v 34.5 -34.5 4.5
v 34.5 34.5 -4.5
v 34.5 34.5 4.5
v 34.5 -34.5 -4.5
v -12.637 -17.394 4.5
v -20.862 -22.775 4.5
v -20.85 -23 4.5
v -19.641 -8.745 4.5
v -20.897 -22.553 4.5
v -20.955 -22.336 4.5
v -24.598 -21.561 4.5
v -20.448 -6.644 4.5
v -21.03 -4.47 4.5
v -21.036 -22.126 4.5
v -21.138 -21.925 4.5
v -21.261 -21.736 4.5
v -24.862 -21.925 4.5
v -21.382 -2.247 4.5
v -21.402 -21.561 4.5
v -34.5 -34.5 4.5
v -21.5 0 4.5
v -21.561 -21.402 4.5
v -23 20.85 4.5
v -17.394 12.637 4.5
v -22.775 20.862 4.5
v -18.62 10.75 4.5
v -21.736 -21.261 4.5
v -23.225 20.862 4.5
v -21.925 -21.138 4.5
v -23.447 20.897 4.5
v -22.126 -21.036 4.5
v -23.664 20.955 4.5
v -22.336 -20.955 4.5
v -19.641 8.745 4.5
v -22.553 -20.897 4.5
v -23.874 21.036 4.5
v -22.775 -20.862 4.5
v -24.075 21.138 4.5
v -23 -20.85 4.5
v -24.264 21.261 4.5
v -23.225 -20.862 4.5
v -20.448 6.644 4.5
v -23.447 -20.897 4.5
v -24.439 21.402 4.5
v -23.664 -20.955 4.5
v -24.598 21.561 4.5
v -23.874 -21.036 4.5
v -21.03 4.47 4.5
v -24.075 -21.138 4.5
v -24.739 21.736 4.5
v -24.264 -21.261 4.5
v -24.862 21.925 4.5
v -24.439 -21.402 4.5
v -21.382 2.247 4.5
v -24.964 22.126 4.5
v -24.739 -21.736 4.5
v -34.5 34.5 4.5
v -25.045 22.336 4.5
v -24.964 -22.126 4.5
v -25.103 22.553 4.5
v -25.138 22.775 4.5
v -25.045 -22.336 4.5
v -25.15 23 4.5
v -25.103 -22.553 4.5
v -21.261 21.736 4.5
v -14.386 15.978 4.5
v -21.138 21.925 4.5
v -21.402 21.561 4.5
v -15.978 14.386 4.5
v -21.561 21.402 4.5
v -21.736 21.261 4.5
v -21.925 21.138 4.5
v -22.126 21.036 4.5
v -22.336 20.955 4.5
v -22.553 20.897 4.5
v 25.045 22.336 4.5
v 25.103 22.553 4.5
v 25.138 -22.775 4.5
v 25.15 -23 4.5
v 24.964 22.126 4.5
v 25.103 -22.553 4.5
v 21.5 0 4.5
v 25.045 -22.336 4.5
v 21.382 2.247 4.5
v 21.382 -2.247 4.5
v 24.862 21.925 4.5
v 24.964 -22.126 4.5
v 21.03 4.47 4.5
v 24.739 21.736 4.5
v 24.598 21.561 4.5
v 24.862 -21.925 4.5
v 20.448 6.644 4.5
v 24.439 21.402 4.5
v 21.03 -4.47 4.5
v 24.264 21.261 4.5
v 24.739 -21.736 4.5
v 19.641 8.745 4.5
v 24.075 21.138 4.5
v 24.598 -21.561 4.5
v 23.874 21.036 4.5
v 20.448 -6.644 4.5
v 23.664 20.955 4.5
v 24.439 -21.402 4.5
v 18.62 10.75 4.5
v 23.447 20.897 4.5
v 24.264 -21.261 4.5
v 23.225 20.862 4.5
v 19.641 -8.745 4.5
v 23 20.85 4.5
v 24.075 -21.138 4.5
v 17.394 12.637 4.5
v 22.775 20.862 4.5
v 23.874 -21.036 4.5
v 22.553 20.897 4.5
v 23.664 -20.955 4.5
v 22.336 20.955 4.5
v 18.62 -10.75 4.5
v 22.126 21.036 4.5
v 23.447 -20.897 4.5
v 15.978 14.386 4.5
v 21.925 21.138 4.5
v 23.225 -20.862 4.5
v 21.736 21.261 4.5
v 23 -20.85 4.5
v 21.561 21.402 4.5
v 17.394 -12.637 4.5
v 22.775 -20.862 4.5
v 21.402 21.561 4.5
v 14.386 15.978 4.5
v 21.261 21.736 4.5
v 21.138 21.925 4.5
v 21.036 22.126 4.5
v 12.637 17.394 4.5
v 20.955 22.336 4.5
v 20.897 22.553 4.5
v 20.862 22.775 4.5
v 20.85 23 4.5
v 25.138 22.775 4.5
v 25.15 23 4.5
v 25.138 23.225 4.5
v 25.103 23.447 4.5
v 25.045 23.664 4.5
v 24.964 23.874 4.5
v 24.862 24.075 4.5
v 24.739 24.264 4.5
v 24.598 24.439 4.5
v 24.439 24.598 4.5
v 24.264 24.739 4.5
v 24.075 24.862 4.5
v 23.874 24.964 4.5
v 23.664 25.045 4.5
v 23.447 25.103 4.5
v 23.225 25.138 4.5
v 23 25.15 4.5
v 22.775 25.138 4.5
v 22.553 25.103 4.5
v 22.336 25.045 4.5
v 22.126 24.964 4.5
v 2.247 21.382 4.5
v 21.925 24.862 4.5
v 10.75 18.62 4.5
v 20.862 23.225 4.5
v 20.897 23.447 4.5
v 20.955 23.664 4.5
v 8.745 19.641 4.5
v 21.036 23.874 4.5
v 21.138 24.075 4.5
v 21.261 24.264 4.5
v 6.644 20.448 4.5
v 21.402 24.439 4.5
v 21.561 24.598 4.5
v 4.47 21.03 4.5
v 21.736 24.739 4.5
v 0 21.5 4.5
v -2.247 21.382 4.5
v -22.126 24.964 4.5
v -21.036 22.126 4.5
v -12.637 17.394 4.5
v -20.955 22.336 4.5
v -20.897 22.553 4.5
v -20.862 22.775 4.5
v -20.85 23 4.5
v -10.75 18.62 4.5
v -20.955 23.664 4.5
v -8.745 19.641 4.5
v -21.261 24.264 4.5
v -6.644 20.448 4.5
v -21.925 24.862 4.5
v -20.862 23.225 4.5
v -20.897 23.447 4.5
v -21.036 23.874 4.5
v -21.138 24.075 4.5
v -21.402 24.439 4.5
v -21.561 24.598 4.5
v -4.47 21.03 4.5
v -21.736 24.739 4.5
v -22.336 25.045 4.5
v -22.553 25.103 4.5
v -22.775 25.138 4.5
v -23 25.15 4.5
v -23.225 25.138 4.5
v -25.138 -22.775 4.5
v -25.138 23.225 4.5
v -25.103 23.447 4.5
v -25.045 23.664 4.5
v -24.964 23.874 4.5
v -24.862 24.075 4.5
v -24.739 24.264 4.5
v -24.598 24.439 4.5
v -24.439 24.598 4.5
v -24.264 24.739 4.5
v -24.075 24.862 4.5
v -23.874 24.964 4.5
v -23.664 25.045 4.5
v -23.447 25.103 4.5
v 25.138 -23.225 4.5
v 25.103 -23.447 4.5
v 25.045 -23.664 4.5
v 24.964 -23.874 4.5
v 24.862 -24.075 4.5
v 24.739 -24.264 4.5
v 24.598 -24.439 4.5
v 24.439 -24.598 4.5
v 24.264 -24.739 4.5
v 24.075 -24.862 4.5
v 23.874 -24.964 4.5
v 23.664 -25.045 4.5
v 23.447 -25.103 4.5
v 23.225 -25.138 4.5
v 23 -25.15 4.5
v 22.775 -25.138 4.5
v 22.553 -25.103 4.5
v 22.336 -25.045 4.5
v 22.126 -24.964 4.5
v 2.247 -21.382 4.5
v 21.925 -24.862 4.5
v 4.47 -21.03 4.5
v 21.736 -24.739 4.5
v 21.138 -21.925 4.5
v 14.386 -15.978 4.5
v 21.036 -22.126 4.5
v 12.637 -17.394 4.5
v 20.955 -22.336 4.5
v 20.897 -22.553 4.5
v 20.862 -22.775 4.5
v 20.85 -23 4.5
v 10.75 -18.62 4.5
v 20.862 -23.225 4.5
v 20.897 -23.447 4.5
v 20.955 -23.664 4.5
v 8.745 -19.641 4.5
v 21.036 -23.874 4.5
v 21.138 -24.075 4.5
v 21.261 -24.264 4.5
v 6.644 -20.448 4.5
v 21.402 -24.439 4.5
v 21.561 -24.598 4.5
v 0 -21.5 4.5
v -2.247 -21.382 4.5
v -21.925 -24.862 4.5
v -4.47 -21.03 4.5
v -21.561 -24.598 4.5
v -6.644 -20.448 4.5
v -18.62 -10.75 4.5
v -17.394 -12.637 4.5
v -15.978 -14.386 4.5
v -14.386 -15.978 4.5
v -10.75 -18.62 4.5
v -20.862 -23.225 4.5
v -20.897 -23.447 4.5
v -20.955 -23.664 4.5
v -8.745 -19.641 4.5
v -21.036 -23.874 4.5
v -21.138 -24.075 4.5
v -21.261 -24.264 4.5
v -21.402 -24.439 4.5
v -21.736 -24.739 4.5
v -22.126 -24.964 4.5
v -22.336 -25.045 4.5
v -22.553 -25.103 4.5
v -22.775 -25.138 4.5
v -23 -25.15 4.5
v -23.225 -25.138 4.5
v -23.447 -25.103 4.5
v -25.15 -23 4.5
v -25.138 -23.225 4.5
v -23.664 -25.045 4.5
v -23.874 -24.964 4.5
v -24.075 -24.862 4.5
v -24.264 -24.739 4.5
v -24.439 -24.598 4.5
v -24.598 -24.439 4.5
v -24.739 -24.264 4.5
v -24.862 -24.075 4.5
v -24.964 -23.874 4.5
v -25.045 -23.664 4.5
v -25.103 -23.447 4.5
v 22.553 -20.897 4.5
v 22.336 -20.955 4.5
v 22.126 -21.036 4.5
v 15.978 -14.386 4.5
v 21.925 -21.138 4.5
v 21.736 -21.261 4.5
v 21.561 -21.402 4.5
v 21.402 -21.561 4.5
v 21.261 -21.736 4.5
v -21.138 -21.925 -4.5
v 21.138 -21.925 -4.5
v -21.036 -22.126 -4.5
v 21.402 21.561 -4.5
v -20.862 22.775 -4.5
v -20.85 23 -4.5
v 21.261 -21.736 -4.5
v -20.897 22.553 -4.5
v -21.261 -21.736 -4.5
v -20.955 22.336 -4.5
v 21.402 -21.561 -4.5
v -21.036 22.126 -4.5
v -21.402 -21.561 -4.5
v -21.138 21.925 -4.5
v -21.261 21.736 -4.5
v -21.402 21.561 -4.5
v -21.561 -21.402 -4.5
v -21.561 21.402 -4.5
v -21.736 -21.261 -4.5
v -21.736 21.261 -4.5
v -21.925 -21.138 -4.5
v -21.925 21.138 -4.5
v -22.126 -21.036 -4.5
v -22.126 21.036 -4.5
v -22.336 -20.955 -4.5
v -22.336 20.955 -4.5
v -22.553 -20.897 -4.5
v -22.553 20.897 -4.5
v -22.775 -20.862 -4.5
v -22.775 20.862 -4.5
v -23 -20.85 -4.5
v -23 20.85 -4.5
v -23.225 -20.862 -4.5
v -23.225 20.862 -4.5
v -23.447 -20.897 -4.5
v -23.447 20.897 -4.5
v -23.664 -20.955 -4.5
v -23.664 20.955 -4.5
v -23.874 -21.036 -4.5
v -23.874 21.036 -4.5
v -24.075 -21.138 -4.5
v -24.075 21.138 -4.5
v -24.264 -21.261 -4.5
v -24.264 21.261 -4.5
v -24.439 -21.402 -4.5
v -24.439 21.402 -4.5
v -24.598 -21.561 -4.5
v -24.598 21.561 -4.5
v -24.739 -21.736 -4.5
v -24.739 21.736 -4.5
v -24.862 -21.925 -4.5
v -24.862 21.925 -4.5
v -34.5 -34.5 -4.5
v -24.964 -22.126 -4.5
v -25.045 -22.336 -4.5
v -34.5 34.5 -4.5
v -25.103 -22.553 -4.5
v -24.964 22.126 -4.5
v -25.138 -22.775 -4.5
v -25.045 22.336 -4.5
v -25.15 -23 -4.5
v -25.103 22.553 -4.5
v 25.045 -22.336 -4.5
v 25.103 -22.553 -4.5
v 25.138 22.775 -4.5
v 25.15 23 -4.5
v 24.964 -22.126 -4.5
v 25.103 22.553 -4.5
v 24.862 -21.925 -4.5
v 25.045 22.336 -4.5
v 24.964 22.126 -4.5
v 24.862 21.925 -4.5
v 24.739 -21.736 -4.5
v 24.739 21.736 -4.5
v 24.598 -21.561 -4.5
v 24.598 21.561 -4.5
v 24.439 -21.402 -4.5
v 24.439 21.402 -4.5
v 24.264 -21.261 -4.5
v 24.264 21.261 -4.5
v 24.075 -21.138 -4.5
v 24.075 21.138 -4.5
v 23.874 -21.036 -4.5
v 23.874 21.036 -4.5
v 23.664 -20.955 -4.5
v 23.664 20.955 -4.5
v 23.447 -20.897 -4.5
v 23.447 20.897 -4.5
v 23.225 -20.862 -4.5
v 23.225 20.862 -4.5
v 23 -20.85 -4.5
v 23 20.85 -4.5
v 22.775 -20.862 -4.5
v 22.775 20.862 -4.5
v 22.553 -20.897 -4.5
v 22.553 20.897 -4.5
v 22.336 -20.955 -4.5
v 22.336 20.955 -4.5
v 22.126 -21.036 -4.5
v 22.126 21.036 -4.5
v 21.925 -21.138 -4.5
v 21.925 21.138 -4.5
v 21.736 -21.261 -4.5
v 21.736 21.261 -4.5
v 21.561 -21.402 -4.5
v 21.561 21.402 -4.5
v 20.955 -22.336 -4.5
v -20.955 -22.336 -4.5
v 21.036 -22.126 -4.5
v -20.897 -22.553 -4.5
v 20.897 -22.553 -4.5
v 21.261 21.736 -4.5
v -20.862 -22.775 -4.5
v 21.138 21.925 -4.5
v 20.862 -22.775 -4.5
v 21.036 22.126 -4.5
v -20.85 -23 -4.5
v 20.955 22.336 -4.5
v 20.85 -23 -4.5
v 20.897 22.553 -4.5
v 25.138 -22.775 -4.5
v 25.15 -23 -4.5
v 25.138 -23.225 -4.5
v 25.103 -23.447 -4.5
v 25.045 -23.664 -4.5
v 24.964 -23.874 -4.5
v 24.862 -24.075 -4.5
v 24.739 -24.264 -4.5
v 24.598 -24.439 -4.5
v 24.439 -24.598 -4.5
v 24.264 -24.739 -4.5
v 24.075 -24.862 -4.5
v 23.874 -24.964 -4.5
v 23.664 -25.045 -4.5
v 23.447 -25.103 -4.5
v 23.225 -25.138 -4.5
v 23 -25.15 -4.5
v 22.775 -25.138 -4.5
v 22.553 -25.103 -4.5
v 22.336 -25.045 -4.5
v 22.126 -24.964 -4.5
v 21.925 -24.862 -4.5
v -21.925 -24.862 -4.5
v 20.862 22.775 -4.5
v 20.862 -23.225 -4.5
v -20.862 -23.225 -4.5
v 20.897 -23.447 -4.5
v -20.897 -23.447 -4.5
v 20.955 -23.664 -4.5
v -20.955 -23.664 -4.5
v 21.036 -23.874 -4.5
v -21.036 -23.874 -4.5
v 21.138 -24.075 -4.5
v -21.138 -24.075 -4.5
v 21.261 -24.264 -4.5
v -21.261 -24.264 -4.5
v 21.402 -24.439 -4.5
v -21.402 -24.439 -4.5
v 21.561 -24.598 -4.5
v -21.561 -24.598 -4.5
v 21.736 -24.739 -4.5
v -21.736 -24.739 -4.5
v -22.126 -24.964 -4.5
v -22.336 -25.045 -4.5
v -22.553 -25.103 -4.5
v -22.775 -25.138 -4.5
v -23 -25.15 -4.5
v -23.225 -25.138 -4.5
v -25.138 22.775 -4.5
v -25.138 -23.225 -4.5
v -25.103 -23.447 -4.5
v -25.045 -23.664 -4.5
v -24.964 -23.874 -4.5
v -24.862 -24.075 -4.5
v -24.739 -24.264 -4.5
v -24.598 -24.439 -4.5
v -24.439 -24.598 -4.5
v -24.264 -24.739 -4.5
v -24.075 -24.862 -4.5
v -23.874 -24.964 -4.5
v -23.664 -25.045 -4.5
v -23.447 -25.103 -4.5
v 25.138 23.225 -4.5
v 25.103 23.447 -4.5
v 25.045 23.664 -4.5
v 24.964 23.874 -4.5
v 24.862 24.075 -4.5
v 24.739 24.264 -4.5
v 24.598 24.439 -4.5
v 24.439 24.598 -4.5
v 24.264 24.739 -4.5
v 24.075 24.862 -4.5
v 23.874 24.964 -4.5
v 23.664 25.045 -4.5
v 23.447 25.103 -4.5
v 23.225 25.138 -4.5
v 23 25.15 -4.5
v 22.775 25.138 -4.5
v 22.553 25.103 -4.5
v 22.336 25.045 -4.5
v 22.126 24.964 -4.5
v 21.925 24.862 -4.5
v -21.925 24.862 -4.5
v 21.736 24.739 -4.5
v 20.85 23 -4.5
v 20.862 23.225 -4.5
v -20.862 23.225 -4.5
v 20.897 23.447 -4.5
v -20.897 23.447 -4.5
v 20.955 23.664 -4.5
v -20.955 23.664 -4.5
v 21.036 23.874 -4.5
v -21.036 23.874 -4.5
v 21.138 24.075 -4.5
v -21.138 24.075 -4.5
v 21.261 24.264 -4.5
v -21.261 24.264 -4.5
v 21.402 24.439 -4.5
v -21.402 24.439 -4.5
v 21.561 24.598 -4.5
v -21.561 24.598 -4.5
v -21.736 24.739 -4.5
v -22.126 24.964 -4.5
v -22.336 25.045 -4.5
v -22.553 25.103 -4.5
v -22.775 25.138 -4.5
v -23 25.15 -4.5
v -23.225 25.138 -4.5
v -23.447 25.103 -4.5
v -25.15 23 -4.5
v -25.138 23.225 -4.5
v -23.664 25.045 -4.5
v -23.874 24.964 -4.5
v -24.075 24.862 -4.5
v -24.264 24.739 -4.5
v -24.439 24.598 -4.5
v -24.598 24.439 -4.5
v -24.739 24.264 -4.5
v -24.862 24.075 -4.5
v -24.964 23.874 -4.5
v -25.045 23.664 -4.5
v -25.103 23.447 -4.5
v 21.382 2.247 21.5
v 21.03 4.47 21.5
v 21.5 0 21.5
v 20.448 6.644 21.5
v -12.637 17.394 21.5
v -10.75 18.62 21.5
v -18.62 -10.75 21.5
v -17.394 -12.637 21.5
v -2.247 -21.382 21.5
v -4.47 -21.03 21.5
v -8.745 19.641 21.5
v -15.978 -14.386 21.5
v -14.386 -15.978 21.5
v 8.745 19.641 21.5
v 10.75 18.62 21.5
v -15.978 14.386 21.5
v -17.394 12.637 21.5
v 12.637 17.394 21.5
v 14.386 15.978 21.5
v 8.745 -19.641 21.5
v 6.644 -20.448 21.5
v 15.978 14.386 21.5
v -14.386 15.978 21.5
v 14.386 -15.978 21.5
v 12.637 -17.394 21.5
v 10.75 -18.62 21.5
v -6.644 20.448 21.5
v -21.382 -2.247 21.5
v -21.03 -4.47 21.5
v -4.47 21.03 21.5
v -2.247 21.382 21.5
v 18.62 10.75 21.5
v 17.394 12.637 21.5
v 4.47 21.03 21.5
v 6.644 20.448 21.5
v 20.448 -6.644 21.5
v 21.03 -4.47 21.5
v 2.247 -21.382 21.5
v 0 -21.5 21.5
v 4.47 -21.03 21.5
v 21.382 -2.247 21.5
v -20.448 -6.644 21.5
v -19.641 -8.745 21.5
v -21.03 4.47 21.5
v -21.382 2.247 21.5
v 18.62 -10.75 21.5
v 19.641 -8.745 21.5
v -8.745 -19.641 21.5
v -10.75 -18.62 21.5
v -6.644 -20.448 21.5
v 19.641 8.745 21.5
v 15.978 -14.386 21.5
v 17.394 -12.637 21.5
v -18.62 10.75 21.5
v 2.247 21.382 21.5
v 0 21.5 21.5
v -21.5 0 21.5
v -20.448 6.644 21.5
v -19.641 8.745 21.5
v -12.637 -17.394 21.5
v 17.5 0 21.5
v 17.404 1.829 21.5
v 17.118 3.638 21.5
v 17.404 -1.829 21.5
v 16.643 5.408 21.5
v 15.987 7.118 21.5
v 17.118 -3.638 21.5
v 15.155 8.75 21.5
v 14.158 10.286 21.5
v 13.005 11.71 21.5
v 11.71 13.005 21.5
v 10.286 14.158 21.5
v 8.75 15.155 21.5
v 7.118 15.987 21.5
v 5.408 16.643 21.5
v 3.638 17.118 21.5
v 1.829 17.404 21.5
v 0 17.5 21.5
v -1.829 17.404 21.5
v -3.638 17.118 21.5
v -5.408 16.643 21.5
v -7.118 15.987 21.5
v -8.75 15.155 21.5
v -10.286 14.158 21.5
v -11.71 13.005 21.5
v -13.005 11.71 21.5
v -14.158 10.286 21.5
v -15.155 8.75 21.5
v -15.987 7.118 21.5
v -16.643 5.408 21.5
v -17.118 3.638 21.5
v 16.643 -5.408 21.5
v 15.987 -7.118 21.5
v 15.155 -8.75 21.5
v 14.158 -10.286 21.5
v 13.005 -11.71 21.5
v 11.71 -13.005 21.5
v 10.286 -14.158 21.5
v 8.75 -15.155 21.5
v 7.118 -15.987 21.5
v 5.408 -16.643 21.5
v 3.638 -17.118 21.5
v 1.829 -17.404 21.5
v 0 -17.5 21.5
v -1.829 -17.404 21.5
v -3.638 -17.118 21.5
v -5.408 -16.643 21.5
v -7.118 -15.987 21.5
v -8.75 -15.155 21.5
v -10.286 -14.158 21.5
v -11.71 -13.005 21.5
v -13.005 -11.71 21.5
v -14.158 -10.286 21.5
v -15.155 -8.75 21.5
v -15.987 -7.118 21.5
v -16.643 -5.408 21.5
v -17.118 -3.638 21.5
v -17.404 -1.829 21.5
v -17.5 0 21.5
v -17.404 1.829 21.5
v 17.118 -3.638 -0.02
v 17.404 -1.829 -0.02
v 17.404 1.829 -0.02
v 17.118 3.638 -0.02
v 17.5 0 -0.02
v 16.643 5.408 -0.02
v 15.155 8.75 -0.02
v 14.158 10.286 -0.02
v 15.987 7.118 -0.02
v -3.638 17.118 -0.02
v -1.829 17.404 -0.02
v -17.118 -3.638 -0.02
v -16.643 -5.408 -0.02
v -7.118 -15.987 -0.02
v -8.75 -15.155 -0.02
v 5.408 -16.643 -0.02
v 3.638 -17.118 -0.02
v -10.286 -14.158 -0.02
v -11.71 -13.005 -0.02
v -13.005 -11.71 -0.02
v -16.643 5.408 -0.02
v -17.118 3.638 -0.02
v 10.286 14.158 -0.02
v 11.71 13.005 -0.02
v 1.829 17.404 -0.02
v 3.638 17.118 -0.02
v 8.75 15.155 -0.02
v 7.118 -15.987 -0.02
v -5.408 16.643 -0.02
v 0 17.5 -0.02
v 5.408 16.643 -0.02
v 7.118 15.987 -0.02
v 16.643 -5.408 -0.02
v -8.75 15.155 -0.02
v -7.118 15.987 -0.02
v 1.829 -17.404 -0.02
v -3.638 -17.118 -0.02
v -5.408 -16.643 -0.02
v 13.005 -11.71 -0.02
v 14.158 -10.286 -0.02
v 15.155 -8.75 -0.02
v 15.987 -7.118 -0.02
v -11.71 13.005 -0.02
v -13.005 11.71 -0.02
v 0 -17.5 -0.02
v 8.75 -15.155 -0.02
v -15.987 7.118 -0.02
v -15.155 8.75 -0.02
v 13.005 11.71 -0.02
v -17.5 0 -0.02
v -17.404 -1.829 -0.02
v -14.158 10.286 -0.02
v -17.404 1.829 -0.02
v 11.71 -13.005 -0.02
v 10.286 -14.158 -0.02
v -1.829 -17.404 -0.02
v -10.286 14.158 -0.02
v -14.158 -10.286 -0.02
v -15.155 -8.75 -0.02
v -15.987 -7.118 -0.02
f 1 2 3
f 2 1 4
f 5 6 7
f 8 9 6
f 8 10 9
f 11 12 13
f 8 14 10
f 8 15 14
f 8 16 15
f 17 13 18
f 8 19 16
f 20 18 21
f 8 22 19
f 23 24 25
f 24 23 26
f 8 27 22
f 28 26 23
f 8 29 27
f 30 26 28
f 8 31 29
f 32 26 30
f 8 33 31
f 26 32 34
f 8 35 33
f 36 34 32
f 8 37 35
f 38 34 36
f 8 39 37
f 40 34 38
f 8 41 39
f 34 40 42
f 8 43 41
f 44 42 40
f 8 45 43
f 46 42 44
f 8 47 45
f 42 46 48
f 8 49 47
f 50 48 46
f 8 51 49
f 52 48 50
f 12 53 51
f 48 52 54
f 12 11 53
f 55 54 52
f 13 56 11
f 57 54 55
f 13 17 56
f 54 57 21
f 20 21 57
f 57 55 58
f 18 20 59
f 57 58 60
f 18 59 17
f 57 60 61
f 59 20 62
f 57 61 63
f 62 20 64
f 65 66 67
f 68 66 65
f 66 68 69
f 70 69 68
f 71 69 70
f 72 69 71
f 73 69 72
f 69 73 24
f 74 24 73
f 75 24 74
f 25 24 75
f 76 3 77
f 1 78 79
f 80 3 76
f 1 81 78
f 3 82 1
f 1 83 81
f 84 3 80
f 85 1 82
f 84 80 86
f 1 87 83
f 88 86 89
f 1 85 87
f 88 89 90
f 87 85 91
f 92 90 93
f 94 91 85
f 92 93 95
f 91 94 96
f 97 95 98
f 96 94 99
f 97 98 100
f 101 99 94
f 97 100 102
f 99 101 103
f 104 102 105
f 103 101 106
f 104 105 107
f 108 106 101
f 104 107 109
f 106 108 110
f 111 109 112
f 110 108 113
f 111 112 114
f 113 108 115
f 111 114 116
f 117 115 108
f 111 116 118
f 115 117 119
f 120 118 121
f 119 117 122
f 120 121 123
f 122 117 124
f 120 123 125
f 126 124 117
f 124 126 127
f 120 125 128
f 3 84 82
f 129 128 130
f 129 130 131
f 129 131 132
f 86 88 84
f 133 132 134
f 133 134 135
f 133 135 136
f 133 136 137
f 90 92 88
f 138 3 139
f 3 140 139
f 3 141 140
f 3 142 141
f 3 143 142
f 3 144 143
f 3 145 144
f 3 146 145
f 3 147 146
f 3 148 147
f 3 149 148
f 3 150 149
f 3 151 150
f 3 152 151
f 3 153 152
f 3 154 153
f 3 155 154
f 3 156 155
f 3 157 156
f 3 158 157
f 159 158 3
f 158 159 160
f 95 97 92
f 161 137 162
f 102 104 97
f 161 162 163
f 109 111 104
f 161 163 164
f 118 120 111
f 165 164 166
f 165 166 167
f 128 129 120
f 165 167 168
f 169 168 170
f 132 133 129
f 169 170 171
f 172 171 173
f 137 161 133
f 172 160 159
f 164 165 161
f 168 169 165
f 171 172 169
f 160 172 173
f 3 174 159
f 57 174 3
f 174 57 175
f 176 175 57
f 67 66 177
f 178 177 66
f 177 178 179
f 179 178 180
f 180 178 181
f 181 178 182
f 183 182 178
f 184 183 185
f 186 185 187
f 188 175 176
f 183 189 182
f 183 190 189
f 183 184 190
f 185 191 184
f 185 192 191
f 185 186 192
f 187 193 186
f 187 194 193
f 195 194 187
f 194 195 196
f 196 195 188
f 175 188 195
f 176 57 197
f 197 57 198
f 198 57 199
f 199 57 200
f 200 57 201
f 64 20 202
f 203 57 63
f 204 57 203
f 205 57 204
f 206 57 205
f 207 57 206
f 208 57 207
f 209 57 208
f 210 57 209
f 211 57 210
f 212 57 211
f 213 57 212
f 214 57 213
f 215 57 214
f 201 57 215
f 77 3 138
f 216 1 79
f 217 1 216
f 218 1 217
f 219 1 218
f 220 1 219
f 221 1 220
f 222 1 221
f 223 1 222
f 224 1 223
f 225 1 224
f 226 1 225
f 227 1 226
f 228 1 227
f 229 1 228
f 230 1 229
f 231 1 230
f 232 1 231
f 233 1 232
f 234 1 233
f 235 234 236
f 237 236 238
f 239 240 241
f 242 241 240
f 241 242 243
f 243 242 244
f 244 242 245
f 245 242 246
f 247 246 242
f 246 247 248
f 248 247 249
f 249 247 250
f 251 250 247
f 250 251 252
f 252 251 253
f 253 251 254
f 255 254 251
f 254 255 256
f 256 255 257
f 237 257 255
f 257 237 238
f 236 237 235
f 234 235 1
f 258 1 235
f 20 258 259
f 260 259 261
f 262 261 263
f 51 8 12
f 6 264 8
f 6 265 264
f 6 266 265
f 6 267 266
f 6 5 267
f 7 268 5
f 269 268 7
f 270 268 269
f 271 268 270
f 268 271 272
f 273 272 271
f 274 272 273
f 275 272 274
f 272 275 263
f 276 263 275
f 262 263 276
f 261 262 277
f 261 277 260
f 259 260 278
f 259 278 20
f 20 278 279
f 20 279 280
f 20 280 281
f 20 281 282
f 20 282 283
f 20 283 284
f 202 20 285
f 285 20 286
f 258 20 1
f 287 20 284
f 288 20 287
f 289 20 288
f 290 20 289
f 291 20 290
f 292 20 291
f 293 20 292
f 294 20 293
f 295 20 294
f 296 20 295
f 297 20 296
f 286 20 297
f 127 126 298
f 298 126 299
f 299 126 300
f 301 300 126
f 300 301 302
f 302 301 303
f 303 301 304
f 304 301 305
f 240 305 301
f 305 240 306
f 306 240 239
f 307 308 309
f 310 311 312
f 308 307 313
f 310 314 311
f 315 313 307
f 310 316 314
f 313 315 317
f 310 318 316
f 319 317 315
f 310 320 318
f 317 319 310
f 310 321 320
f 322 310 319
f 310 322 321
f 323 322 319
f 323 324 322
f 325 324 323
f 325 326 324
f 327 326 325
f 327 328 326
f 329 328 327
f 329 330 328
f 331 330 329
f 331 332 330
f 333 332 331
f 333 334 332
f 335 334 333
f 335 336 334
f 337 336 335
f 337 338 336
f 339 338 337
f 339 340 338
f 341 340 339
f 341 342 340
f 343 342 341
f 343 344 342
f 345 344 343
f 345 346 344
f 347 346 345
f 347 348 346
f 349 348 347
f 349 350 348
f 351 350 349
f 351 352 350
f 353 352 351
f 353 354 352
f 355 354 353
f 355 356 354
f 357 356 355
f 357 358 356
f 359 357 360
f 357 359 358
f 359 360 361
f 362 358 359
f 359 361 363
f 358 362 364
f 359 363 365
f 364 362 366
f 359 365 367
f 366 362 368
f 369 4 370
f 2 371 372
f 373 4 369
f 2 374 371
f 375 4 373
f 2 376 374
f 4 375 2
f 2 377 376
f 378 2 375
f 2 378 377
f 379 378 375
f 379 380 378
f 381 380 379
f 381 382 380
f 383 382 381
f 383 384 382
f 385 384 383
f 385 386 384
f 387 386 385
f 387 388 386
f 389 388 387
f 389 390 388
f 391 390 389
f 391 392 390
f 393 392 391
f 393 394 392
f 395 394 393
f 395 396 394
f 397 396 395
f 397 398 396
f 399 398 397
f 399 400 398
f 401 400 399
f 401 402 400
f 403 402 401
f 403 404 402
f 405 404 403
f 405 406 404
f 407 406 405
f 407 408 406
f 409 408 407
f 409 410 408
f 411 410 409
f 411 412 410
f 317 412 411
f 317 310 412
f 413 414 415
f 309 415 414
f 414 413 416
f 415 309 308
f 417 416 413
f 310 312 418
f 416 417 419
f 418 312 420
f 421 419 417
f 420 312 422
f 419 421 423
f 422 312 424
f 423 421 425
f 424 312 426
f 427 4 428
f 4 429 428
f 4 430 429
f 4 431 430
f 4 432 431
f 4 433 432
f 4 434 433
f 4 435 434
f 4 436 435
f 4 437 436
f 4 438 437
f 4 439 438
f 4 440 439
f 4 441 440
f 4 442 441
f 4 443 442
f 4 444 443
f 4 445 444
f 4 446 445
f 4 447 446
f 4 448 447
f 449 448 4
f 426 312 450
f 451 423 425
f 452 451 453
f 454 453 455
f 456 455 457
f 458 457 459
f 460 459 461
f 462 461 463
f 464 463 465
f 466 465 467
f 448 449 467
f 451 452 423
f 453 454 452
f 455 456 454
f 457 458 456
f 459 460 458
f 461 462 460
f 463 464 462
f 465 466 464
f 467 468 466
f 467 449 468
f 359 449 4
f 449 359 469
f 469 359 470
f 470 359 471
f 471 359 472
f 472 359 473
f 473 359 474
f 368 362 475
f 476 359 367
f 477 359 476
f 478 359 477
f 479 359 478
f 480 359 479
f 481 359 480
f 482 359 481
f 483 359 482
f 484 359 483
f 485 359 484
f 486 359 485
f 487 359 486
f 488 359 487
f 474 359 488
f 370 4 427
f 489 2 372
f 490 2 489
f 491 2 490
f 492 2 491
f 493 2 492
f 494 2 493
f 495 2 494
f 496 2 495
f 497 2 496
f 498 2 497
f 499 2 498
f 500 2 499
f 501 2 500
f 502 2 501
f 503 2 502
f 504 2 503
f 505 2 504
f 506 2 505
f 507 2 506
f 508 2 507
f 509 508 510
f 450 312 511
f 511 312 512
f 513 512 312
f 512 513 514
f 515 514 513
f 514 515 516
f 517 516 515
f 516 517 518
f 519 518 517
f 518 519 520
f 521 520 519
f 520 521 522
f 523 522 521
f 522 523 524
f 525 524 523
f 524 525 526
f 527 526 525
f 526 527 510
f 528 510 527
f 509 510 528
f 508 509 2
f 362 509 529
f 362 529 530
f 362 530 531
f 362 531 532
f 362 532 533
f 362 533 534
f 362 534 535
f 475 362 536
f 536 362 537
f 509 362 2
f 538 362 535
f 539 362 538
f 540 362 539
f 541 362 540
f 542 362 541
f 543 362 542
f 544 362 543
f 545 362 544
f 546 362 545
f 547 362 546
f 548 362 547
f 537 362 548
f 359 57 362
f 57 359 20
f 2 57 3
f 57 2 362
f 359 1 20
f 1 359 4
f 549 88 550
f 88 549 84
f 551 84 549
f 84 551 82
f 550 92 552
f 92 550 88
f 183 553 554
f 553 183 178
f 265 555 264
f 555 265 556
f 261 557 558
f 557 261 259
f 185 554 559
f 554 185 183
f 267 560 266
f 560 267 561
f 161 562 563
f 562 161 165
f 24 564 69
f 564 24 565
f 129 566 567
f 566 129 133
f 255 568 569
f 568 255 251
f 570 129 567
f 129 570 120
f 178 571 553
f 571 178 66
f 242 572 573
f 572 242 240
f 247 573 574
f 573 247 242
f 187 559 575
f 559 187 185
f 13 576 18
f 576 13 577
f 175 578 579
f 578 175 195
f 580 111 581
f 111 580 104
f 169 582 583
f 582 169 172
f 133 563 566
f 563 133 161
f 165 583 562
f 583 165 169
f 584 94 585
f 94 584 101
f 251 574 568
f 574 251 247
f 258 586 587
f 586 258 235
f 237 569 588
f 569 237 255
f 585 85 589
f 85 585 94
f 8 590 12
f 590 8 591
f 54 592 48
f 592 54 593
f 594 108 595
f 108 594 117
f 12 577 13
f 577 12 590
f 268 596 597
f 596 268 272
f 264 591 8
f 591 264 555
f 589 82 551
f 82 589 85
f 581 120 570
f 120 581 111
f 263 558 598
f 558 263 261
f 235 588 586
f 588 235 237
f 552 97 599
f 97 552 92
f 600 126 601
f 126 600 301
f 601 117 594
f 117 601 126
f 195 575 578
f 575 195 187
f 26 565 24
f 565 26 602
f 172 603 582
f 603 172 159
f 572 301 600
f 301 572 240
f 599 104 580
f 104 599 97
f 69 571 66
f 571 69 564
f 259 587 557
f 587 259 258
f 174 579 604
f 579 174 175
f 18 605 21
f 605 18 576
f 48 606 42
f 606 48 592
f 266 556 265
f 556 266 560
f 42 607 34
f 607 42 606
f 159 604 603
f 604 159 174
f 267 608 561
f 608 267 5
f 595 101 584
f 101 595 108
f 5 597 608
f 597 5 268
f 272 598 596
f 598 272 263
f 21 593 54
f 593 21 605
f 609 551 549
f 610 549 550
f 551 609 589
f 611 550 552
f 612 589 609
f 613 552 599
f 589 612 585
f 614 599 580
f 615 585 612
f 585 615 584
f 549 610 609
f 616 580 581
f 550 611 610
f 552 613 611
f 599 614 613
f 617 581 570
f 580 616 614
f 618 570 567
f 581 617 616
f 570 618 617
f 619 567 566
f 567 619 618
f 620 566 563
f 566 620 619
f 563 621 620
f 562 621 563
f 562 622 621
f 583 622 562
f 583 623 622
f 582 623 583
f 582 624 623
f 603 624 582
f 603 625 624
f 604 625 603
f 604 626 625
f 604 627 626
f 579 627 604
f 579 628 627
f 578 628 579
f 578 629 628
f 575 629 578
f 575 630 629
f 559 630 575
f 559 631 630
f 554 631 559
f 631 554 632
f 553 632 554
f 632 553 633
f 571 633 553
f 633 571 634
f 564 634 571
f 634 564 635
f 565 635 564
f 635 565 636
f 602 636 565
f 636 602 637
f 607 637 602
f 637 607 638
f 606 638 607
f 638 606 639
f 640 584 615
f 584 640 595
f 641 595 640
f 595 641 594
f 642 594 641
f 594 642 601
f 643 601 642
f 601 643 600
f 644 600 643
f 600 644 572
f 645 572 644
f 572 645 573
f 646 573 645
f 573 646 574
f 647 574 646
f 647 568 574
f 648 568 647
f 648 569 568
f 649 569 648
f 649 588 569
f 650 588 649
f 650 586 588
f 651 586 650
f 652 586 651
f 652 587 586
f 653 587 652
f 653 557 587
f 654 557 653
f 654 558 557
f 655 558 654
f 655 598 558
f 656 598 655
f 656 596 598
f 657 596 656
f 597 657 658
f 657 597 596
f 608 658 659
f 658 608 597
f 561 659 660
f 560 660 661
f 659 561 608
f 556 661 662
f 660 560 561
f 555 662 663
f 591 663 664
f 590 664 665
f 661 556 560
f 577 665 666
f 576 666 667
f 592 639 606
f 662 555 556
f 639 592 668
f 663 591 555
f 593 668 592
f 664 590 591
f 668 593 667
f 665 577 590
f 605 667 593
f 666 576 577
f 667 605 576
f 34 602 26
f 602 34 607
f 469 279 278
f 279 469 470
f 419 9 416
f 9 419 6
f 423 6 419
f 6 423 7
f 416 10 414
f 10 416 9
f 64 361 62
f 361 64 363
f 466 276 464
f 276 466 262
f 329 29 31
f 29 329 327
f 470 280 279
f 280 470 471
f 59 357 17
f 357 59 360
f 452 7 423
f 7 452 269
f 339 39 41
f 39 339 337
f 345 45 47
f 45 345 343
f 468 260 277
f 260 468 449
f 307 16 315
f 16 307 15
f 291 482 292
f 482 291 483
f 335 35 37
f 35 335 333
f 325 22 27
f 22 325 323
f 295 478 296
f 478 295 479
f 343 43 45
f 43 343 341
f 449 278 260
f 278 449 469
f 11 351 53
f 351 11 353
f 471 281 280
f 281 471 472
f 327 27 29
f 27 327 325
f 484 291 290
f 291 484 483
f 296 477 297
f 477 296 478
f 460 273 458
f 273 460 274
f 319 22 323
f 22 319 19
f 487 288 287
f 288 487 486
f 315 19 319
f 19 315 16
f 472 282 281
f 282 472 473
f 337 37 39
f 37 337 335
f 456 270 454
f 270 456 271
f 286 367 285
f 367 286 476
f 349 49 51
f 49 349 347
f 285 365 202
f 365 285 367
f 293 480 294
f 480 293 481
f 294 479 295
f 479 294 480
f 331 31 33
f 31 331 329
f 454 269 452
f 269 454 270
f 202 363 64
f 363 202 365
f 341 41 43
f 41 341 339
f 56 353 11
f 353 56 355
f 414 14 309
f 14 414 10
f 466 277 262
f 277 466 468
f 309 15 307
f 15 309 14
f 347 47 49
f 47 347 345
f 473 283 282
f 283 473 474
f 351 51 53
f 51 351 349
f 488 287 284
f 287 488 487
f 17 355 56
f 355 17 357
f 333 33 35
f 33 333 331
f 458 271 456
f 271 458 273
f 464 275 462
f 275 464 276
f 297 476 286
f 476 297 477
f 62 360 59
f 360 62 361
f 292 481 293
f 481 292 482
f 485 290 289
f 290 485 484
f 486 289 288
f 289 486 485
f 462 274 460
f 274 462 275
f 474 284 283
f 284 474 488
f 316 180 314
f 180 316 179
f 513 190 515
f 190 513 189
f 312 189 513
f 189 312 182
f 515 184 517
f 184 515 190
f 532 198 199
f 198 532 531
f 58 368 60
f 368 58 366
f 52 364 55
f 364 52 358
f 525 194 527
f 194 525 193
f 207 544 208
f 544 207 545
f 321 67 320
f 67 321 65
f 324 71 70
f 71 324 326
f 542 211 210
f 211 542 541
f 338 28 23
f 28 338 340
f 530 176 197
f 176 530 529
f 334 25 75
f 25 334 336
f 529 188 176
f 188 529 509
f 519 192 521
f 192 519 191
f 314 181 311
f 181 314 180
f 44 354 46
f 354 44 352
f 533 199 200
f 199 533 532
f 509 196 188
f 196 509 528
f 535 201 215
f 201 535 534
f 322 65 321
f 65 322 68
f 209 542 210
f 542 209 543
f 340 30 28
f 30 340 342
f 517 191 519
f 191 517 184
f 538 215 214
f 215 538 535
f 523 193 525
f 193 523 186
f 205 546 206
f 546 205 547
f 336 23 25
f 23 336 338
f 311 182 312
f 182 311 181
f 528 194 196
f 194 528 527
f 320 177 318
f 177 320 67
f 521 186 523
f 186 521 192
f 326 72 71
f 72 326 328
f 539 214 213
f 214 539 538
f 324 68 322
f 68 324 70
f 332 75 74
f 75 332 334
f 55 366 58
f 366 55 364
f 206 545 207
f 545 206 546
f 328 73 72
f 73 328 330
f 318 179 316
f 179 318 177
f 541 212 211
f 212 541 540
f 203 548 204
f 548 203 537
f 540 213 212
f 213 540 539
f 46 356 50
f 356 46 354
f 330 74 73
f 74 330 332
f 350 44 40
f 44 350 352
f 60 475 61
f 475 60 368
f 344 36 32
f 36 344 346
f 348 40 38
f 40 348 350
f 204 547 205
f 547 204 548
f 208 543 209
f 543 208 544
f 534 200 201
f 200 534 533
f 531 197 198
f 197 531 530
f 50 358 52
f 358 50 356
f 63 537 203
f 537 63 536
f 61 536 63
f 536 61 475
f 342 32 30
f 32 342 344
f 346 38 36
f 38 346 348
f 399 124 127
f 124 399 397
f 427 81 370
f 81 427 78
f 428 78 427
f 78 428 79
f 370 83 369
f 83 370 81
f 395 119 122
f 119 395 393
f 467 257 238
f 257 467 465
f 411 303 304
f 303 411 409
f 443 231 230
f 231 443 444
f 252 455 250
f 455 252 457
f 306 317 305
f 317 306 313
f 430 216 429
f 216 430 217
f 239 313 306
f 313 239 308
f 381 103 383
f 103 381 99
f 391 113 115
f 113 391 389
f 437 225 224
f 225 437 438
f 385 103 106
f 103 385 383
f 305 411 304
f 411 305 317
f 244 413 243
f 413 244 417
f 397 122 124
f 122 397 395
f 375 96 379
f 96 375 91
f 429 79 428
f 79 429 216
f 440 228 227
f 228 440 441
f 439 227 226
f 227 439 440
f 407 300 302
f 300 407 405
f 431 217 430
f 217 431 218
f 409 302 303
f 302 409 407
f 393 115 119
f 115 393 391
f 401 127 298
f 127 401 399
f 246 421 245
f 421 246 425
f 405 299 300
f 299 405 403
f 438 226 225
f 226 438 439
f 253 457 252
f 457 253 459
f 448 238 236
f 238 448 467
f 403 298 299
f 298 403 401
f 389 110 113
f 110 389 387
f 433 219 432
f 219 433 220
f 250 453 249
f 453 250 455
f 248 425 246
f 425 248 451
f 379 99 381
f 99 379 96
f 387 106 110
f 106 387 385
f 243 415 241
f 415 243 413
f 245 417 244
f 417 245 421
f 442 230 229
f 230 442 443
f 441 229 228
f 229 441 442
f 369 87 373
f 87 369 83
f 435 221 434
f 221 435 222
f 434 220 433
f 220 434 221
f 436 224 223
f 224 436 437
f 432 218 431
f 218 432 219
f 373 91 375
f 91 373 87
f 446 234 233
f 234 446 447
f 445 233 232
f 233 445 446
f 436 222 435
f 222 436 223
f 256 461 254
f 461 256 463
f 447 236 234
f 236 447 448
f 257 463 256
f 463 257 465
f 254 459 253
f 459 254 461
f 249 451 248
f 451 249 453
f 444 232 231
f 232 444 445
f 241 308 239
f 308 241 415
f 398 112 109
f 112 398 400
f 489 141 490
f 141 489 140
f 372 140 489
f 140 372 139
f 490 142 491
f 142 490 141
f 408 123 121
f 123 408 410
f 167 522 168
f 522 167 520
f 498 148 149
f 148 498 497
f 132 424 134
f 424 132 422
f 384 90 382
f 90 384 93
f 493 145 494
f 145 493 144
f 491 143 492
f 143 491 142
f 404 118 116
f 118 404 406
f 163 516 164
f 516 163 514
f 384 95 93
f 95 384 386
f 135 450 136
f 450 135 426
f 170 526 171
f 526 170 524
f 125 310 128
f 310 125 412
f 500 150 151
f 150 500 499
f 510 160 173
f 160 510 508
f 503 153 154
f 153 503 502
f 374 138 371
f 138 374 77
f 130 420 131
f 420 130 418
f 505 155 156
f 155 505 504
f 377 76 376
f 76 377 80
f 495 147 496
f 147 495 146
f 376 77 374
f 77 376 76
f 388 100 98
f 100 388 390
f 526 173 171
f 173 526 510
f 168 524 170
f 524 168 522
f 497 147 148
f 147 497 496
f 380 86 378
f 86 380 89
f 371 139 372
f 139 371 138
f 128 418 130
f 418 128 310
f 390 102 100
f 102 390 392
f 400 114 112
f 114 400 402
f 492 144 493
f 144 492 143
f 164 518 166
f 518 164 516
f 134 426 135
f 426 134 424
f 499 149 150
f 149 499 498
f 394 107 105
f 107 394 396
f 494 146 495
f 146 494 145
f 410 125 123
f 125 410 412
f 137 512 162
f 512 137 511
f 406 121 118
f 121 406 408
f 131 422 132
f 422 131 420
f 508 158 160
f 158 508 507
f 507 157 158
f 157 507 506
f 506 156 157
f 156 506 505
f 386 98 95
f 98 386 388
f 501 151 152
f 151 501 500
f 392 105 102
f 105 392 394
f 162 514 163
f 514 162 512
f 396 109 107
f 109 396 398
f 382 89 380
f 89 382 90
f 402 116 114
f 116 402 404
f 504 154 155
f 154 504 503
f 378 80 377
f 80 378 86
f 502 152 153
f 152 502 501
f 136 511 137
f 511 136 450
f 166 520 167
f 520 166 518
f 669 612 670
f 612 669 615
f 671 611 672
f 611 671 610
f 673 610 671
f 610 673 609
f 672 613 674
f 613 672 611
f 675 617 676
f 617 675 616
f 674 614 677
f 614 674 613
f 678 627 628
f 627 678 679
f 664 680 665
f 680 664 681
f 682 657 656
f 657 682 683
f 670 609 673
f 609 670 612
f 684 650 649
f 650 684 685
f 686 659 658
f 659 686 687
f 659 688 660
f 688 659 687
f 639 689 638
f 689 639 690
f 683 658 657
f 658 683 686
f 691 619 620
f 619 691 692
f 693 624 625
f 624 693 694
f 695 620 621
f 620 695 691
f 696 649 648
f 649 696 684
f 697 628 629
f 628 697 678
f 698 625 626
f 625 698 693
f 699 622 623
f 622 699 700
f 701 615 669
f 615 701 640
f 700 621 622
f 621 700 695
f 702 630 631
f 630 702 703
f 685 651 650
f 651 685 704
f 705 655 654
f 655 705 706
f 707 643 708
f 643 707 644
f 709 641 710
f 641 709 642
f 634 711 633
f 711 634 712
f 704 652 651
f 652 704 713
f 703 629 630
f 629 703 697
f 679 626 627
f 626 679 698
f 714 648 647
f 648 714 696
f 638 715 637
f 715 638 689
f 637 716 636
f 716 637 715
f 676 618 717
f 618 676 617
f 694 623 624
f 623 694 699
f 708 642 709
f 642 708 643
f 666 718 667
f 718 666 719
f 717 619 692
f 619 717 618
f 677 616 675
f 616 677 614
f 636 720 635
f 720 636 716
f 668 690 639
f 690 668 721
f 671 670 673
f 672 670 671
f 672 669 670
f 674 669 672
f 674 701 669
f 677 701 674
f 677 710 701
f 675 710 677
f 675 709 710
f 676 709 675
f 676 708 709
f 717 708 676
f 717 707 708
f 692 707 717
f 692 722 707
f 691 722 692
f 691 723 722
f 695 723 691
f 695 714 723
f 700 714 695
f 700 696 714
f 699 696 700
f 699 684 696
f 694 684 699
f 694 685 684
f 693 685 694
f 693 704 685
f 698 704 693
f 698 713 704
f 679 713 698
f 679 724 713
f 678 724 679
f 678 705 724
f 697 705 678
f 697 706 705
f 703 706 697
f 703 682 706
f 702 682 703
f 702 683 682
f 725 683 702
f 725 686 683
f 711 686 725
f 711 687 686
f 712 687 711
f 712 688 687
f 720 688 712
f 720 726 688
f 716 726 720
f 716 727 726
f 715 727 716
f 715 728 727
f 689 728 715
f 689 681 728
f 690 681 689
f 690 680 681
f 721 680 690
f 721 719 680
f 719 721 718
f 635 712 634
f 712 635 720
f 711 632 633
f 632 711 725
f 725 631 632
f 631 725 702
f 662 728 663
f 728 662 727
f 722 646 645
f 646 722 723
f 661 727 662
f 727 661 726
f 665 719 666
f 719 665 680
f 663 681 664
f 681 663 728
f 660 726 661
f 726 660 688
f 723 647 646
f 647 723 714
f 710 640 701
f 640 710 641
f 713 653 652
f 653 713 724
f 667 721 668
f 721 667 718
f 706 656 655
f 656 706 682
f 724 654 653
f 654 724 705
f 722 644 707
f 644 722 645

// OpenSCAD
// Flange bearing block for 35 mm bearing OD.
$fn = 60;
eps = 0.02;
bearing_d = 35;
plate_l = bearing_d + 34;
plate_t = 9;
hub_h = bearing_d / 2 + 4;
difference() {
    union() {
        cube([plate_l, plate_l, plate_t], center = true);
        cylinder(d = bearing_d + 8, h = hub_h);
    }
    translate([0, 0, -eps]) cylinder(d = bearing_d, h = hub_h + 2 * eps);
    for (x = [-plate_l / 3, plate_l / 3], y = [-plate_l / 3, plate_l / 3])
        translate([x, y, -plate_t / 2 - eps]) cylinder(d = 4.3, h = plate_t + 2 * eps);
}
